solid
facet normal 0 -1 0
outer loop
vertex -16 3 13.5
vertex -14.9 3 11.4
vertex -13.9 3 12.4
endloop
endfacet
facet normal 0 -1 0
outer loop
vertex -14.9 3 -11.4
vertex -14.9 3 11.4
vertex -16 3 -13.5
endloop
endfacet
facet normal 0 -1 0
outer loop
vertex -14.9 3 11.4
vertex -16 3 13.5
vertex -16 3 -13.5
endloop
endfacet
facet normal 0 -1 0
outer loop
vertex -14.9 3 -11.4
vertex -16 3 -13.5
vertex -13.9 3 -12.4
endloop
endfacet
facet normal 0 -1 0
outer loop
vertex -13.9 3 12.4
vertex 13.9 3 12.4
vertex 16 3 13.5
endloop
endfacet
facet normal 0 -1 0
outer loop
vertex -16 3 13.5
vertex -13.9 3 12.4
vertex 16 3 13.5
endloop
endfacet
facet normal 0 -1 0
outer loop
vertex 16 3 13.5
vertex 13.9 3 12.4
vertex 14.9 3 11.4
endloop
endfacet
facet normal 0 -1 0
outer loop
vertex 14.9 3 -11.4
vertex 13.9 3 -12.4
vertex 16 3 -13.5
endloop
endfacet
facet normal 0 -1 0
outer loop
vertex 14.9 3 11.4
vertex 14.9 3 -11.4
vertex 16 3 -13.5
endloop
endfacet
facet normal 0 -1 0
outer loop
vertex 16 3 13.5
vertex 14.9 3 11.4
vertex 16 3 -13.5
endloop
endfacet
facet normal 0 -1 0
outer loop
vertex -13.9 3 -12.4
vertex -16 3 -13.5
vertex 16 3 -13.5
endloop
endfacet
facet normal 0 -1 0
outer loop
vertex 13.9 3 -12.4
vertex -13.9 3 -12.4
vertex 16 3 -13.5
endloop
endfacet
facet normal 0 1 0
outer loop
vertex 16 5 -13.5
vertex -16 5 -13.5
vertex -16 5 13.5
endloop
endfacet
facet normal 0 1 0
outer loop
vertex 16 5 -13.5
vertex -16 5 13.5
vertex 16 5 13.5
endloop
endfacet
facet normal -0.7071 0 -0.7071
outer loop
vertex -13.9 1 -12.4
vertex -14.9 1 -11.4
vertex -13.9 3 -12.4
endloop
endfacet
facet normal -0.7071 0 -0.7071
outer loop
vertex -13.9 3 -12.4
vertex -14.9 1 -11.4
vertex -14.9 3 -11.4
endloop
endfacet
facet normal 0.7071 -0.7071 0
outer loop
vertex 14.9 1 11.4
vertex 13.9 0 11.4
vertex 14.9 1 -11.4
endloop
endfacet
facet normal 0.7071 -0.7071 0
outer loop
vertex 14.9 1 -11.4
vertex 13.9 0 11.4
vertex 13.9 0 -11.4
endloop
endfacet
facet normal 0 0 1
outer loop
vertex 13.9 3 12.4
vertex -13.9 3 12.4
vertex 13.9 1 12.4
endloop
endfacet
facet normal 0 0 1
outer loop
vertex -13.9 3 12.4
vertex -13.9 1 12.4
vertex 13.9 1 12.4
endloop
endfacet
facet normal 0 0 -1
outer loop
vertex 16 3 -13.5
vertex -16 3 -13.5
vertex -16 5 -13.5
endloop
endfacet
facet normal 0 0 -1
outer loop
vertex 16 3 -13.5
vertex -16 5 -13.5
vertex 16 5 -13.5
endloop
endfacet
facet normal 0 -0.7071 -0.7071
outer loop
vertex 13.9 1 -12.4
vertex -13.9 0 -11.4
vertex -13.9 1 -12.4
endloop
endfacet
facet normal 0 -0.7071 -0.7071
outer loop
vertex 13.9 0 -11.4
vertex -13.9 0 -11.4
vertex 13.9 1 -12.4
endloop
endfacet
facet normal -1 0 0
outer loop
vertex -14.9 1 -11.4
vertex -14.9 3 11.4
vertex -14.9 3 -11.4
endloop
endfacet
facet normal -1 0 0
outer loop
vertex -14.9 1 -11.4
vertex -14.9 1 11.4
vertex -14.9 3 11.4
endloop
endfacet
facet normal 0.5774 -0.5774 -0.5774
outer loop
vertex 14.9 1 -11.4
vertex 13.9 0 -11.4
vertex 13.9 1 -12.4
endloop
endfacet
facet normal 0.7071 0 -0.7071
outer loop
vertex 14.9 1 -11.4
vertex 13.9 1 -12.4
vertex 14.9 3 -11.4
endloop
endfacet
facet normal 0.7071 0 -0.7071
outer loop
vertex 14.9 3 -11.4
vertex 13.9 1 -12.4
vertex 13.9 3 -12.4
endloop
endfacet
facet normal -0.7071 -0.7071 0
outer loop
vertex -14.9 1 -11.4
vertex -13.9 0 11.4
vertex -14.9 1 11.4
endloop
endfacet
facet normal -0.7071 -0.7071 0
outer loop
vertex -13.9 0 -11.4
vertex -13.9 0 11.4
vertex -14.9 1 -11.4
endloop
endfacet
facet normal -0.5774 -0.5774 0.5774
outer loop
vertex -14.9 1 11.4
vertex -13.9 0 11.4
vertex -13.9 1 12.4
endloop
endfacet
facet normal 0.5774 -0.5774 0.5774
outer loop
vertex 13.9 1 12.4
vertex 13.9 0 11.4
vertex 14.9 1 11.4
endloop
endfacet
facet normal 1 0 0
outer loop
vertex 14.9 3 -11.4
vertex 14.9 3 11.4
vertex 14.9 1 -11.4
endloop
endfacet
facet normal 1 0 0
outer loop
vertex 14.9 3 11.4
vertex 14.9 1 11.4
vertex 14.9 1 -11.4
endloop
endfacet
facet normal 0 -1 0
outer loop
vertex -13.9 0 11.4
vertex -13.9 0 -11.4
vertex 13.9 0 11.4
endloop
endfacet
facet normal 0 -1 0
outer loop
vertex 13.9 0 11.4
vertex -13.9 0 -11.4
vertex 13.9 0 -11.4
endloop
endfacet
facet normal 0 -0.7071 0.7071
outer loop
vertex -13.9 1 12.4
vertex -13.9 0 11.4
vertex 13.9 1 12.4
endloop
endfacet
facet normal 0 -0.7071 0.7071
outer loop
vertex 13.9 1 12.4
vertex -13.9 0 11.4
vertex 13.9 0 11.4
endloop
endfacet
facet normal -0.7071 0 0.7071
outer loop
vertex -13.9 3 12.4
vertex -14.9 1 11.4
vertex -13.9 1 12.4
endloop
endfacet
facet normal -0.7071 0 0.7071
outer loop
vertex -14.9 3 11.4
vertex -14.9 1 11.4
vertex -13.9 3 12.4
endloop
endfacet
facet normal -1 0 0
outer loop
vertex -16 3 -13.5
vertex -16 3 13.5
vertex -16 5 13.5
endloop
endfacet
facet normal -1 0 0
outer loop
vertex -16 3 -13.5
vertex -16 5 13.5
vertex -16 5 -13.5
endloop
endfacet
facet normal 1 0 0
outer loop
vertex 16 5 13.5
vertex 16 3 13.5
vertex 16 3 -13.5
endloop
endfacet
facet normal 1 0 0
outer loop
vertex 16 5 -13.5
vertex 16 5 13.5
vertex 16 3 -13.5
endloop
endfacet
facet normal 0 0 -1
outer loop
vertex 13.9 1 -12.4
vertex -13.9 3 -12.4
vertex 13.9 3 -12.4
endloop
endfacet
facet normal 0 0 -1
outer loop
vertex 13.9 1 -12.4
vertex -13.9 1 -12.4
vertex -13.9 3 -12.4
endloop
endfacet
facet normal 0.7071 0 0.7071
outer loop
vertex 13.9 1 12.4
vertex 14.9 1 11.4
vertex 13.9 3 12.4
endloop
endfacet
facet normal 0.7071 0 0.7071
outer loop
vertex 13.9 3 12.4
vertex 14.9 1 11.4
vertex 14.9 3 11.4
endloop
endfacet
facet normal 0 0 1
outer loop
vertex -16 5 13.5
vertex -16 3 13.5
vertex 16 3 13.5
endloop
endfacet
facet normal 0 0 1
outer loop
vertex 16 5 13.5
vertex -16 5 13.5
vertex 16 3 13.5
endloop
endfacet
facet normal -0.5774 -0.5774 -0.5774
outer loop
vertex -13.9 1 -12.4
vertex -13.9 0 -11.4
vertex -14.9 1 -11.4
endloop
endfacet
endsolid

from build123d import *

# Parameters (mm, degrees)
SKETCH1_W           = 29.8
SKETCH1_H           = 24.8
BOSS_EXTRUDE1_DEPTH = 3
SKETCH2_W           = 32
SKETCH2_H           = 27
BOSS_EXTRUDE2_DEPTH = 2
CHAMFER1_SIZE       = 1


with BuildPart() as part:
    # Sketch1 → Boss-Extrude1 (new body)
    with BuildSketch(Plane(origin=(0, 0, 0), x_dir=(1, 0, 0), z_dir=(0, 1, 0))):
        Rectangle(SKETCH1_W, SKETCH1_H)
    extrude(amount=BOSS_EXTRUDE1_DEPTH)

    # Sketch2 → Boss-Extrude2 (add)
    with BuildSketch(Plane(origin=(0, 3, 0), x_dir=(1, 0, 0), z_dir=(0, 1, 0))):
        Rectangle(SKETCH2_W, SKETCH2_H)
    extrude(amount=BOSS_EXTRUDE2_DEPTH)

    # Chamfer1
    chamfer1_edges = [part.edges().sort_by_distance(p)[0] for p in [
        (0, 0, -12.4),
        (14.9, 0, 0),
        (0, 0, 12.4),
        (-14.9, 0, 0),
        (-14.9, 1.5, -12.4),
        (14.9, 1.5, -12.4),
        (14.9, 1.5, 12.4),
        (-14.9, 1.5, 12.4),
    ]]
    chamfer(chamfer1_edges, length=CHAMFER1_SIZE)


solid = part.part
